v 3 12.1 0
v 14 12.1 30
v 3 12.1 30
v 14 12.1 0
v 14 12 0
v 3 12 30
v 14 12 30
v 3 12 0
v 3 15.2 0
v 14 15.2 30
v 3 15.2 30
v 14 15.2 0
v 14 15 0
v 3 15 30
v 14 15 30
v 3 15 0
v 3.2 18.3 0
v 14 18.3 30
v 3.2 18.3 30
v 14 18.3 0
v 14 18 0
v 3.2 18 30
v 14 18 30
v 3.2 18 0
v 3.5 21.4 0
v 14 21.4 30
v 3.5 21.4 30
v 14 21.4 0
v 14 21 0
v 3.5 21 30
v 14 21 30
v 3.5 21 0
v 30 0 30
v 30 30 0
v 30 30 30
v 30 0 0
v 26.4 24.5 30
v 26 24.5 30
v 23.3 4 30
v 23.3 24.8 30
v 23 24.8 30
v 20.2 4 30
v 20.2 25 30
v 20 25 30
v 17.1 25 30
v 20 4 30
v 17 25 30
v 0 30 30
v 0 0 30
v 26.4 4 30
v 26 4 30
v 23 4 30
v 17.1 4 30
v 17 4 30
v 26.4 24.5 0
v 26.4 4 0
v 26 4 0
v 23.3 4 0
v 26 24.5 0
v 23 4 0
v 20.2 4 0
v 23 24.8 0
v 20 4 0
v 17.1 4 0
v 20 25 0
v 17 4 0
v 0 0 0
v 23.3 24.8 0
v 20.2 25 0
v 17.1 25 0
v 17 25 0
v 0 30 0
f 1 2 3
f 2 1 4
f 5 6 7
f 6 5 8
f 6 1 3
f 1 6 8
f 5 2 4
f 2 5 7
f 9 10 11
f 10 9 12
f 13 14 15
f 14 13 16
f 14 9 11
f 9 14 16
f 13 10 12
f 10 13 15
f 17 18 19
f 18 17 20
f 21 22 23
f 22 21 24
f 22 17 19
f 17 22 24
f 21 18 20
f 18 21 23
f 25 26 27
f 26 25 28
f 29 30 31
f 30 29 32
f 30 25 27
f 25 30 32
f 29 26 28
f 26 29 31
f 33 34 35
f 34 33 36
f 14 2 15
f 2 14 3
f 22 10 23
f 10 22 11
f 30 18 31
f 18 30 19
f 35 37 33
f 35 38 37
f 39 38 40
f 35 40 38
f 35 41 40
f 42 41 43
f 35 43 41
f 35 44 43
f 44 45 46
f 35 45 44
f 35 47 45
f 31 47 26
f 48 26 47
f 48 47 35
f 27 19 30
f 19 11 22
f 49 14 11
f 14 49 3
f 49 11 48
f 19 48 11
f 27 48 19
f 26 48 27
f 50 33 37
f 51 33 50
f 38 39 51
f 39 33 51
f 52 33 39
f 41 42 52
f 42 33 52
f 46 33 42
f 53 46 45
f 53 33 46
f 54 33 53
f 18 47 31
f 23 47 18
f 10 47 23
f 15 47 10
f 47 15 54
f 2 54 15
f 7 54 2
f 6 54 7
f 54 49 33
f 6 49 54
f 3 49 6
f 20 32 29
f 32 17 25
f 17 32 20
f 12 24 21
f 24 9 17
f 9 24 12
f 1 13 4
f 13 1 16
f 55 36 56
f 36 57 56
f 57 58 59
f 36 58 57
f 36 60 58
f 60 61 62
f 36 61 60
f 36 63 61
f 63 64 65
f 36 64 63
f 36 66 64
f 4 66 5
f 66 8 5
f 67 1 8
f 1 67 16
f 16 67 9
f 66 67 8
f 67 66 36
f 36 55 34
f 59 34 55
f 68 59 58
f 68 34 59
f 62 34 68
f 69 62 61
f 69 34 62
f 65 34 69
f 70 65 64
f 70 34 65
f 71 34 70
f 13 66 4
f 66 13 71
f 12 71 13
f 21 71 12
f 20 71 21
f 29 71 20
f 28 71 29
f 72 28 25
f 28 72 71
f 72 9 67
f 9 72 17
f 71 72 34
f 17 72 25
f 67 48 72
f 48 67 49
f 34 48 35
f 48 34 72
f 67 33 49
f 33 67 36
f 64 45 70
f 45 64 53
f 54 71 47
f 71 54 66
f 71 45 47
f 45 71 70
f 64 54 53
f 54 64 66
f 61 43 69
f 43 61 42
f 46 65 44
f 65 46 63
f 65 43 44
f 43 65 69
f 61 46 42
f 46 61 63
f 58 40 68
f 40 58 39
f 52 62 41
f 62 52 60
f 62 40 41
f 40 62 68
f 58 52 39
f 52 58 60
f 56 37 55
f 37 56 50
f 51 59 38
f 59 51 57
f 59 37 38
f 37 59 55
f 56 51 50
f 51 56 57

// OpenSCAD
$fn=100;



    
difference()
{
    cube([30,30,30]);

    
    translate([18,10,0])rotate([0,0,90]) {
        translate([2,4,-1]) cube([0.1,11,40]);
        translate([5,4,-1]) cube([0.2,11,40]);
        translate([8,4,-1]) cube([0.3,10.8,40]);
        translate([11,4,-1]) cube([0.4,10.5,40]);
    }
    
    translate([17,4,-1]) cube([0.1,21,40]);
    translate([20,4,-1]) cube([0.2,21,40]);
    translate([23,4,-1]) cube([0.3,20.8,40]);
    translate([26,4,-1]) cube([0.4,20.5,40]);
    //}
}
